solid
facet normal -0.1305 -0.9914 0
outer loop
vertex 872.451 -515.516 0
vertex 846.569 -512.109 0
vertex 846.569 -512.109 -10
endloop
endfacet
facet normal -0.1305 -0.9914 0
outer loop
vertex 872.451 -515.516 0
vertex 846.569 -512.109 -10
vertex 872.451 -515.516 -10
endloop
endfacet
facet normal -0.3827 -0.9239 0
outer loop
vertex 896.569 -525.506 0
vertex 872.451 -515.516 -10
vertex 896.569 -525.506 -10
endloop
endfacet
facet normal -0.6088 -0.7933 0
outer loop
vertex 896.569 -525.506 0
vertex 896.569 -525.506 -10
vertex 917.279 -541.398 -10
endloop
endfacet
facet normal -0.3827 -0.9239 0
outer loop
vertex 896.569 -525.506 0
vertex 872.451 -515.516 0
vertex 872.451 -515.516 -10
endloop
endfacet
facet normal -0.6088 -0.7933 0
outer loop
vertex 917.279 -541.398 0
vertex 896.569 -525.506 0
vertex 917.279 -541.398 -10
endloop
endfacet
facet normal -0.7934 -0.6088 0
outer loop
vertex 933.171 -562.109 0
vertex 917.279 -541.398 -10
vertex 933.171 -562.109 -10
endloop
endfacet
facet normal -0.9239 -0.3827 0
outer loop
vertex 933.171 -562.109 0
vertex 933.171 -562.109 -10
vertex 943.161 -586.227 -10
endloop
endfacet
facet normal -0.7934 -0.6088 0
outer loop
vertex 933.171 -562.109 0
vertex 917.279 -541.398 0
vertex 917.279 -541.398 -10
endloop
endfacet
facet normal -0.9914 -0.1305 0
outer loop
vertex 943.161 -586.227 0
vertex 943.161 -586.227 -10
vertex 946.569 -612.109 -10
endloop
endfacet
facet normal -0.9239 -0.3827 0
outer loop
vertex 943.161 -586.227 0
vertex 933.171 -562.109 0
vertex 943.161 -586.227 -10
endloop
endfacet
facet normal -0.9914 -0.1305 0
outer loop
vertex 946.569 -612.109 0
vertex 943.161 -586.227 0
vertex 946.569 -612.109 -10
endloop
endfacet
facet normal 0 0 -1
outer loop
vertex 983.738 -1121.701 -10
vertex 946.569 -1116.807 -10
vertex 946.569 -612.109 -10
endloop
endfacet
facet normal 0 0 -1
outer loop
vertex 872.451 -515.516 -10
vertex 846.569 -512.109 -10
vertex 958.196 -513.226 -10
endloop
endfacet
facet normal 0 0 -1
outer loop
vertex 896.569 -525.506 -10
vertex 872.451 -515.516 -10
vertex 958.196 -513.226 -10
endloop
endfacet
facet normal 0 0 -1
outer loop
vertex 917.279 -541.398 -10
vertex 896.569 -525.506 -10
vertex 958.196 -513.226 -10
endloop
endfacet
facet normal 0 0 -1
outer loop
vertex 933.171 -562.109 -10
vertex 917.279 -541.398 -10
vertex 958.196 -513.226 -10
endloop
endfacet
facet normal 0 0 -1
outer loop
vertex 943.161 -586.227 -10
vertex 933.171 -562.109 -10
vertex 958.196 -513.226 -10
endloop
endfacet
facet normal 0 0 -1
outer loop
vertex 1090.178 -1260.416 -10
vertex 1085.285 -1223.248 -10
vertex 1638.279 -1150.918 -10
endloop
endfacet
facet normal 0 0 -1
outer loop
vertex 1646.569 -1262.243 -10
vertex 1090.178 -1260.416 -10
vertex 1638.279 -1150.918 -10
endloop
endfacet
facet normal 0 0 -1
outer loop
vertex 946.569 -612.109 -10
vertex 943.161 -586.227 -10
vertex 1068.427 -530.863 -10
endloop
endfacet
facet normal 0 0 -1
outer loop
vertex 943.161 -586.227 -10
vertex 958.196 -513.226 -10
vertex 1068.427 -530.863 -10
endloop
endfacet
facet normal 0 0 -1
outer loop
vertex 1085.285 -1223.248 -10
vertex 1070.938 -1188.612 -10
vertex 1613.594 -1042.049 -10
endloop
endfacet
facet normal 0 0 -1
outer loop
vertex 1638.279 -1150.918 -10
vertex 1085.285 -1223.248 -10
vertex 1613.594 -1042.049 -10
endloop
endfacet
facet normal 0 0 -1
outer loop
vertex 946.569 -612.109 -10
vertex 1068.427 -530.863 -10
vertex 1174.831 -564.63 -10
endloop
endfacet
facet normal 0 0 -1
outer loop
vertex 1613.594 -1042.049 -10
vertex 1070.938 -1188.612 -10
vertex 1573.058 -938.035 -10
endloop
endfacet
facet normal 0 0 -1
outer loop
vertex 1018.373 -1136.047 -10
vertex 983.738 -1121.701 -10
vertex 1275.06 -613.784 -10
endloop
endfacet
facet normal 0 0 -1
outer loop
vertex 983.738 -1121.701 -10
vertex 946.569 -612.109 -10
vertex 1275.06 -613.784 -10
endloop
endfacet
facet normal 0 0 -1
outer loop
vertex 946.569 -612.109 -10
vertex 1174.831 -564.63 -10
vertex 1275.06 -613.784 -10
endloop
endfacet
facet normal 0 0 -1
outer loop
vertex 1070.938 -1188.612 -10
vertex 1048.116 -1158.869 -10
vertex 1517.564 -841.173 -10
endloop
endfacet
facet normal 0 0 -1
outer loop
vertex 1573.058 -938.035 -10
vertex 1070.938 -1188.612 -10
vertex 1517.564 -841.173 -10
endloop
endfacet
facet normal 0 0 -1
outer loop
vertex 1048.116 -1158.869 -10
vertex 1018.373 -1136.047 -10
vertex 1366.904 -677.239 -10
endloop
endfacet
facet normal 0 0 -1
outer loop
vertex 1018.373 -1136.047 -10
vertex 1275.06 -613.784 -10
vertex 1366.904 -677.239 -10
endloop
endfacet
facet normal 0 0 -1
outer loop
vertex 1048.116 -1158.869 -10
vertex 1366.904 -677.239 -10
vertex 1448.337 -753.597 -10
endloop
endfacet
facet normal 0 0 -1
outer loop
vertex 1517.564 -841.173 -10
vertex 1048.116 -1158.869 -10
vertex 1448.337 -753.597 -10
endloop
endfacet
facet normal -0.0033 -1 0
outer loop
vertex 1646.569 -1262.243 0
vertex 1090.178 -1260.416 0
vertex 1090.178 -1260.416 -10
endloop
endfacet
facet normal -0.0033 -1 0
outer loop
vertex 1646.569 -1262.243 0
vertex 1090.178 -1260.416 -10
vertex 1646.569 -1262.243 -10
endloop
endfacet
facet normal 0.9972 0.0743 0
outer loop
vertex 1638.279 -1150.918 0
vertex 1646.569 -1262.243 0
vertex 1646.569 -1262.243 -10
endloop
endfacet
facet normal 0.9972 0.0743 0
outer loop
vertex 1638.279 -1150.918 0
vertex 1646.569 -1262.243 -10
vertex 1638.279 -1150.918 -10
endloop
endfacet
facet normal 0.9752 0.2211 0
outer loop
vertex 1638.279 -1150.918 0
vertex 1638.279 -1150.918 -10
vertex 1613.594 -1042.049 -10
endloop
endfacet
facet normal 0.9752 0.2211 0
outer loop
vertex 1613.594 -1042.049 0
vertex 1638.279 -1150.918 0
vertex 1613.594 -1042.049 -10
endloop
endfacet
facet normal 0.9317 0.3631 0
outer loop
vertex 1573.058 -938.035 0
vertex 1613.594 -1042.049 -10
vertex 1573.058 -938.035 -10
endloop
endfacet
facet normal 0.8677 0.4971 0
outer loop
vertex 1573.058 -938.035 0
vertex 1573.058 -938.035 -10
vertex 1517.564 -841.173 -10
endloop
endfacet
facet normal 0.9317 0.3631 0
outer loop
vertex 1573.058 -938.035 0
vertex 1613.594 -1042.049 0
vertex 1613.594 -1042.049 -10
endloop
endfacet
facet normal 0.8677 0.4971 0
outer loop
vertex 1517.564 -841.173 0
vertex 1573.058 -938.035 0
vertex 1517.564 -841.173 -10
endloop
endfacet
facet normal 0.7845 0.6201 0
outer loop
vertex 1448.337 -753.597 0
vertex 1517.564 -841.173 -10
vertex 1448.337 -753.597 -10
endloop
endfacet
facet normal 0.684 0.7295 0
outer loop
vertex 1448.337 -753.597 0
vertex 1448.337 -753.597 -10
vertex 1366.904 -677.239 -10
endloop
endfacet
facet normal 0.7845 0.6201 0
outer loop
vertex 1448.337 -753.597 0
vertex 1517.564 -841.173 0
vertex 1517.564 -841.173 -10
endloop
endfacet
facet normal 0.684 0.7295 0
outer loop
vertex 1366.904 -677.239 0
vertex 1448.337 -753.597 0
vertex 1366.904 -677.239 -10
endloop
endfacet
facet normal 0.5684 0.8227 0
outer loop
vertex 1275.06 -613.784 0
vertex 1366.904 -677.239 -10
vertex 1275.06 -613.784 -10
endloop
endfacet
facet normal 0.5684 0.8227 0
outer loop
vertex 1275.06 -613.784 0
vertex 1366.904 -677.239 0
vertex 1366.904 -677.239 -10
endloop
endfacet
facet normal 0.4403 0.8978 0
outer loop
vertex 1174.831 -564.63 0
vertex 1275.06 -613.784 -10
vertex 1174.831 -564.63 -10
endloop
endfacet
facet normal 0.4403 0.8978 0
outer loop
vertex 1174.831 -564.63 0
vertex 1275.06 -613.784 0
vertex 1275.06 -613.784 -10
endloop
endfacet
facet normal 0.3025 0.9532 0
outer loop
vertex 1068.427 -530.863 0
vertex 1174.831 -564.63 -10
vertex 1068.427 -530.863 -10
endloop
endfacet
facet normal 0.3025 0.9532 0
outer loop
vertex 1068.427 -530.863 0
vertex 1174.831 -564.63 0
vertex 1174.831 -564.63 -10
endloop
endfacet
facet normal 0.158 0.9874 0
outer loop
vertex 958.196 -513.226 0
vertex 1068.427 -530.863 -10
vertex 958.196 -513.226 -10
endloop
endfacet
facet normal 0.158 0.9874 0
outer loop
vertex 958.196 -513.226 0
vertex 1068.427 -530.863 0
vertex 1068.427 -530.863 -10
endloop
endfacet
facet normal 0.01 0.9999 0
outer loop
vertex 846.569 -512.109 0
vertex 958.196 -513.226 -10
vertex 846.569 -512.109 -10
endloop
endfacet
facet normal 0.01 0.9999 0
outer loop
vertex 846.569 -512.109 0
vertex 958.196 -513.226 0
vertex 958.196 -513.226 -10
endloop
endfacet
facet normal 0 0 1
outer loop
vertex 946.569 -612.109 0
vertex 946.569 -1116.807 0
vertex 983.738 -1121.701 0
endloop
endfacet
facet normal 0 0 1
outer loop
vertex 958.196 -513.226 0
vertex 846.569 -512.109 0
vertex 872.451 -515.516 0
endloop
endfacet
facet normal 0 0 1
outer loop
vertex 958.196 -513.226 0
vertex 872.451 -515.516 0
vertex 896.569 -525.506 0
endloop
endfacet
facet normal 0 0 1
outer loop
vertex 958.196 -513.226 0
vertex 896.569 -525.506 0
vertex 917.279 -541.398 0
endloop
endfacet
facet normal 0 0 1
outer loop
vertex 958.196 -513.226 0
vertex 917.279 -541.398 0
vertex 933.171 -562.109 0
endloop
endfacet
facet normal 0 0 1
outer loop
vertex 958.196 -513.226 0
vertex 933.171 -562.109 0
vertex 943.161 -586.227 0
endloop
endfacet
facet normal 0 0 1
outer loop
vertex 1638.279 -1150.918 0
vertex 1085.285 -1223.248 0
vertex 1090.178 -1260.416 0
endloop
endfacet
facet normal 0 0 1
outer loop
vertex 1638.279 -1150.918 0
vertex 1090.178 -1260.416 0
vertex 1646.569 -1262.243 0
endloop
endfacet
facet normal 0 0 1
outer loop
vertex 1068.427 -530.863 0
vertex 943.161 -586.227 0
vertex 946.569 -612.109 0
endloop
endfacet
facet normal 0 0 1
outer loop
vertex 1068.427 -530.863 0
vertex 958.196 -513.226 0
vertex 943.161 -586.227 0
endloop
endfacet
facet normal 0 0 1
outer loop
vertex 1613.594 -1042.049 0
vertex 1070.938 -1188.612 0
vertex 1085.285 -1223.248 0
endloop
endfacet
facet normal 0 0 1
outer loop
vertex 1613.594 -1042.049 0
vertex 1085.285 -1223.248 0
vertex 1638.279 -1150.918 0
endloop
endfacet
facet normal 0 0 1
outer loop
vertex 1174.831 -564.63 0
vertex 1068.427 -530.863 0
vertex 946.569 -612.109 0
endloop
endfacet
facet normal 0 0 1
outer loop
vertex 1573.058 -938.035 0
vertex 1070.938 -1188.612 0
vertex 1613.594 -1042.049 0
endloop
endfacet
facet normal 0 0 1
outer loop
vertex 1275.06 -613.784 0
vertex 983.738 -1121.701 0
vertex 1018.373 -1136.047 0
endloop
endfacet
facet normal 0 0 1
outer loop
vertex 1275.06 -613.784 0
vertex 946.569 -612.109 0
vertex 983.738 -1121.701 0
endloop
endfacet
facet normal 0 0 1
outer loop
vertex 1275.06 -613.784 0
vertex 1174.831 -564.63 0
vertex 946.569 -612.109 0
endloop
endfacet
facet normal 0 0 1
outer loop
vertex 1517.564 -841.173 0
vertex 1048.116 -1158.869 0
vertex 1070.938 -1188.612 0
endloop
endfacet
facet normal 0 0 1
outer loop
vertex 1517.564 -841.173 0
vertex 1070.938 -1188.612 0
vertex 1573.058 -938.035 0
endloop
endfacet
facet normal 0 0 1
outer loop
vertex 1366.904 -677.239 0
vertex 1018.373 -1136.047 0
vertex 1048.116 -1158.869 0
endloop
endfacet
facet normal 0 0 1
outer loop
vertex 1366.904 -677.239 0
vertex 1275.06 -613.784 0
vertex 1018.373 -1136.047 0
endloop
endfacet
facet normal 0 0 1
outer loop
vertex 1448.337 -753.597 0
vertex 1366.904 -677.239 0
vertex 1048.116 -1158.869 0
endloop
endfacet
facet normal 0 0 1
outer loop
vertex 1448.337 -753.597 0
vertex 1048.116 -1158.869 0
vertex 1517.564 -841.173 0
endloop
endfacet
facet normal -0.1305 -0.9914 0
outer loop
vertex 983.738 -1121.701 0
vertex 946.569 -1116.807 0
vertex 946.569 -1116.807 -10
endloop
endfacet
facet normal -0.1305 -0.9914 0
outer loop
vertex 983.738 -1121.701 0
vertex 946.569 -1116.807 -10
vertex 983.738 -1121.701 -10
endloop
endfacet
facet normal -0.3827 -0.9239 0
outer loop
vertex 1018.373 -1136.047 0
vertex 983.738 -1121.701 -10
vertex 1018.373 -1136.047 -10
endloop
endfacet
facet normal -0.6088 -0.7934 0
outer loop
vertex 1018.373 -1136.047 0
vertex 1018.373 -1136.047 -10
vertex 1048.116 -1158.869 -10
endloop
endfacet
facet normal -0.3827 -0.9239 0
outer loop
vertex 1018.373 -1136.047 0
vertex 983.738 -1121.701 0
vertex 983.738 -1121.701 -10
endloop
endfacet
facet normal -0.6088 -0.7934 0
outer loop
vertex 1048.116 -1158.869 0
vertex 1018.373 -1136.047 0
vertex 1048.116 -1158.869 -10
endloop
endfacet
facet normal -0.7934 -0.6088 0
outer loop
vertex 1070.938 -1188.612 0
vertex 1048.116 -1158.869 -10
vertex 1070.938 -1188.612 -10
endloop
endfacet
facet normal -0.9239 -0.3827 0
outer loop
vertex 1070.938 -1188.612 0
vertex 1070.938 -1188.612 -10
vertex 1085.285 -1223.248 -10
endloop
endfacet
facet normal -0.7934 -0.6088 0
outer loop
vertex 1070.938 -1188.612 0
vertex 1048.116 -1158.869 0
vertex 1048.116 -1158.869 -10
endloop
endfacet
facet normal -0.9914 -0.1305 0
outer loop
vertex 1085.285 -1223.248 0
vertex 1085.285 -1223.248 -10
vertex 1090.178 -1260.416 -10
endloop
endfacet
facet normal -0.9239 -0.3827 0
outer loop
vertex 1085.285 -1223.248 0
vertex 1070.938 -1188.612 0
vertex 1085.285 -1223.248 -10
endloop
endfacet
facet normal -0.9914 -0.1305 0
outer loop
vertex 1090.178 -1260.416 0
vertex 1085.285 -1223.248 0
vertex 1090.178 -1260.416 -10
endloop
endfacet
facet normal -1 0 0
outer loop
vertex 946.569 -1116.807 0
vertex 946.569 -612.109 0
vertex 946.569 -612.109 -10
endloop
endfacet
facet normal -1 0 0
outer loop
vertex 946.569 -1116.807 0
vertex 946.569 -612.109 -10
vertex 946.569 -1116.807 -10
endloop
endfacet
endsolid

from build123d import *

# Parameters (mm, degrees)
BOSS_EXTRUDE2_DEPTH = 10


with BuildPart() as part:
    # Sketch1 → Boss-Extrude2 (new body)
    with BuildSketch(Plane.XY):
        with BuildLine():
            Line((946.568769473, -612.108653834), (946.568769473, -1116.807153033))
            ThreePointArc((946.568769473, -1116.807153033), (1048.115870255, -1158.869339396), (1090.178056619, -1260.416440178))
            Line((1090.178056619, -1260.416440178), (1646.568769473, -1262.242939545))
            ThreePointArc((1646.568769473, -1262.242939545), (1409.039966295, -713.90421061), (846.568769473, -512.108653834))
            ThreePointArc((846.568769473, -512.108653834), (917.279447592, -541.397975715), (946.568769473, -612.108653834))
        make_face()
    extrude(amount=-BOSS_EXTRUDE2_DEPTH)


solid = part.part
